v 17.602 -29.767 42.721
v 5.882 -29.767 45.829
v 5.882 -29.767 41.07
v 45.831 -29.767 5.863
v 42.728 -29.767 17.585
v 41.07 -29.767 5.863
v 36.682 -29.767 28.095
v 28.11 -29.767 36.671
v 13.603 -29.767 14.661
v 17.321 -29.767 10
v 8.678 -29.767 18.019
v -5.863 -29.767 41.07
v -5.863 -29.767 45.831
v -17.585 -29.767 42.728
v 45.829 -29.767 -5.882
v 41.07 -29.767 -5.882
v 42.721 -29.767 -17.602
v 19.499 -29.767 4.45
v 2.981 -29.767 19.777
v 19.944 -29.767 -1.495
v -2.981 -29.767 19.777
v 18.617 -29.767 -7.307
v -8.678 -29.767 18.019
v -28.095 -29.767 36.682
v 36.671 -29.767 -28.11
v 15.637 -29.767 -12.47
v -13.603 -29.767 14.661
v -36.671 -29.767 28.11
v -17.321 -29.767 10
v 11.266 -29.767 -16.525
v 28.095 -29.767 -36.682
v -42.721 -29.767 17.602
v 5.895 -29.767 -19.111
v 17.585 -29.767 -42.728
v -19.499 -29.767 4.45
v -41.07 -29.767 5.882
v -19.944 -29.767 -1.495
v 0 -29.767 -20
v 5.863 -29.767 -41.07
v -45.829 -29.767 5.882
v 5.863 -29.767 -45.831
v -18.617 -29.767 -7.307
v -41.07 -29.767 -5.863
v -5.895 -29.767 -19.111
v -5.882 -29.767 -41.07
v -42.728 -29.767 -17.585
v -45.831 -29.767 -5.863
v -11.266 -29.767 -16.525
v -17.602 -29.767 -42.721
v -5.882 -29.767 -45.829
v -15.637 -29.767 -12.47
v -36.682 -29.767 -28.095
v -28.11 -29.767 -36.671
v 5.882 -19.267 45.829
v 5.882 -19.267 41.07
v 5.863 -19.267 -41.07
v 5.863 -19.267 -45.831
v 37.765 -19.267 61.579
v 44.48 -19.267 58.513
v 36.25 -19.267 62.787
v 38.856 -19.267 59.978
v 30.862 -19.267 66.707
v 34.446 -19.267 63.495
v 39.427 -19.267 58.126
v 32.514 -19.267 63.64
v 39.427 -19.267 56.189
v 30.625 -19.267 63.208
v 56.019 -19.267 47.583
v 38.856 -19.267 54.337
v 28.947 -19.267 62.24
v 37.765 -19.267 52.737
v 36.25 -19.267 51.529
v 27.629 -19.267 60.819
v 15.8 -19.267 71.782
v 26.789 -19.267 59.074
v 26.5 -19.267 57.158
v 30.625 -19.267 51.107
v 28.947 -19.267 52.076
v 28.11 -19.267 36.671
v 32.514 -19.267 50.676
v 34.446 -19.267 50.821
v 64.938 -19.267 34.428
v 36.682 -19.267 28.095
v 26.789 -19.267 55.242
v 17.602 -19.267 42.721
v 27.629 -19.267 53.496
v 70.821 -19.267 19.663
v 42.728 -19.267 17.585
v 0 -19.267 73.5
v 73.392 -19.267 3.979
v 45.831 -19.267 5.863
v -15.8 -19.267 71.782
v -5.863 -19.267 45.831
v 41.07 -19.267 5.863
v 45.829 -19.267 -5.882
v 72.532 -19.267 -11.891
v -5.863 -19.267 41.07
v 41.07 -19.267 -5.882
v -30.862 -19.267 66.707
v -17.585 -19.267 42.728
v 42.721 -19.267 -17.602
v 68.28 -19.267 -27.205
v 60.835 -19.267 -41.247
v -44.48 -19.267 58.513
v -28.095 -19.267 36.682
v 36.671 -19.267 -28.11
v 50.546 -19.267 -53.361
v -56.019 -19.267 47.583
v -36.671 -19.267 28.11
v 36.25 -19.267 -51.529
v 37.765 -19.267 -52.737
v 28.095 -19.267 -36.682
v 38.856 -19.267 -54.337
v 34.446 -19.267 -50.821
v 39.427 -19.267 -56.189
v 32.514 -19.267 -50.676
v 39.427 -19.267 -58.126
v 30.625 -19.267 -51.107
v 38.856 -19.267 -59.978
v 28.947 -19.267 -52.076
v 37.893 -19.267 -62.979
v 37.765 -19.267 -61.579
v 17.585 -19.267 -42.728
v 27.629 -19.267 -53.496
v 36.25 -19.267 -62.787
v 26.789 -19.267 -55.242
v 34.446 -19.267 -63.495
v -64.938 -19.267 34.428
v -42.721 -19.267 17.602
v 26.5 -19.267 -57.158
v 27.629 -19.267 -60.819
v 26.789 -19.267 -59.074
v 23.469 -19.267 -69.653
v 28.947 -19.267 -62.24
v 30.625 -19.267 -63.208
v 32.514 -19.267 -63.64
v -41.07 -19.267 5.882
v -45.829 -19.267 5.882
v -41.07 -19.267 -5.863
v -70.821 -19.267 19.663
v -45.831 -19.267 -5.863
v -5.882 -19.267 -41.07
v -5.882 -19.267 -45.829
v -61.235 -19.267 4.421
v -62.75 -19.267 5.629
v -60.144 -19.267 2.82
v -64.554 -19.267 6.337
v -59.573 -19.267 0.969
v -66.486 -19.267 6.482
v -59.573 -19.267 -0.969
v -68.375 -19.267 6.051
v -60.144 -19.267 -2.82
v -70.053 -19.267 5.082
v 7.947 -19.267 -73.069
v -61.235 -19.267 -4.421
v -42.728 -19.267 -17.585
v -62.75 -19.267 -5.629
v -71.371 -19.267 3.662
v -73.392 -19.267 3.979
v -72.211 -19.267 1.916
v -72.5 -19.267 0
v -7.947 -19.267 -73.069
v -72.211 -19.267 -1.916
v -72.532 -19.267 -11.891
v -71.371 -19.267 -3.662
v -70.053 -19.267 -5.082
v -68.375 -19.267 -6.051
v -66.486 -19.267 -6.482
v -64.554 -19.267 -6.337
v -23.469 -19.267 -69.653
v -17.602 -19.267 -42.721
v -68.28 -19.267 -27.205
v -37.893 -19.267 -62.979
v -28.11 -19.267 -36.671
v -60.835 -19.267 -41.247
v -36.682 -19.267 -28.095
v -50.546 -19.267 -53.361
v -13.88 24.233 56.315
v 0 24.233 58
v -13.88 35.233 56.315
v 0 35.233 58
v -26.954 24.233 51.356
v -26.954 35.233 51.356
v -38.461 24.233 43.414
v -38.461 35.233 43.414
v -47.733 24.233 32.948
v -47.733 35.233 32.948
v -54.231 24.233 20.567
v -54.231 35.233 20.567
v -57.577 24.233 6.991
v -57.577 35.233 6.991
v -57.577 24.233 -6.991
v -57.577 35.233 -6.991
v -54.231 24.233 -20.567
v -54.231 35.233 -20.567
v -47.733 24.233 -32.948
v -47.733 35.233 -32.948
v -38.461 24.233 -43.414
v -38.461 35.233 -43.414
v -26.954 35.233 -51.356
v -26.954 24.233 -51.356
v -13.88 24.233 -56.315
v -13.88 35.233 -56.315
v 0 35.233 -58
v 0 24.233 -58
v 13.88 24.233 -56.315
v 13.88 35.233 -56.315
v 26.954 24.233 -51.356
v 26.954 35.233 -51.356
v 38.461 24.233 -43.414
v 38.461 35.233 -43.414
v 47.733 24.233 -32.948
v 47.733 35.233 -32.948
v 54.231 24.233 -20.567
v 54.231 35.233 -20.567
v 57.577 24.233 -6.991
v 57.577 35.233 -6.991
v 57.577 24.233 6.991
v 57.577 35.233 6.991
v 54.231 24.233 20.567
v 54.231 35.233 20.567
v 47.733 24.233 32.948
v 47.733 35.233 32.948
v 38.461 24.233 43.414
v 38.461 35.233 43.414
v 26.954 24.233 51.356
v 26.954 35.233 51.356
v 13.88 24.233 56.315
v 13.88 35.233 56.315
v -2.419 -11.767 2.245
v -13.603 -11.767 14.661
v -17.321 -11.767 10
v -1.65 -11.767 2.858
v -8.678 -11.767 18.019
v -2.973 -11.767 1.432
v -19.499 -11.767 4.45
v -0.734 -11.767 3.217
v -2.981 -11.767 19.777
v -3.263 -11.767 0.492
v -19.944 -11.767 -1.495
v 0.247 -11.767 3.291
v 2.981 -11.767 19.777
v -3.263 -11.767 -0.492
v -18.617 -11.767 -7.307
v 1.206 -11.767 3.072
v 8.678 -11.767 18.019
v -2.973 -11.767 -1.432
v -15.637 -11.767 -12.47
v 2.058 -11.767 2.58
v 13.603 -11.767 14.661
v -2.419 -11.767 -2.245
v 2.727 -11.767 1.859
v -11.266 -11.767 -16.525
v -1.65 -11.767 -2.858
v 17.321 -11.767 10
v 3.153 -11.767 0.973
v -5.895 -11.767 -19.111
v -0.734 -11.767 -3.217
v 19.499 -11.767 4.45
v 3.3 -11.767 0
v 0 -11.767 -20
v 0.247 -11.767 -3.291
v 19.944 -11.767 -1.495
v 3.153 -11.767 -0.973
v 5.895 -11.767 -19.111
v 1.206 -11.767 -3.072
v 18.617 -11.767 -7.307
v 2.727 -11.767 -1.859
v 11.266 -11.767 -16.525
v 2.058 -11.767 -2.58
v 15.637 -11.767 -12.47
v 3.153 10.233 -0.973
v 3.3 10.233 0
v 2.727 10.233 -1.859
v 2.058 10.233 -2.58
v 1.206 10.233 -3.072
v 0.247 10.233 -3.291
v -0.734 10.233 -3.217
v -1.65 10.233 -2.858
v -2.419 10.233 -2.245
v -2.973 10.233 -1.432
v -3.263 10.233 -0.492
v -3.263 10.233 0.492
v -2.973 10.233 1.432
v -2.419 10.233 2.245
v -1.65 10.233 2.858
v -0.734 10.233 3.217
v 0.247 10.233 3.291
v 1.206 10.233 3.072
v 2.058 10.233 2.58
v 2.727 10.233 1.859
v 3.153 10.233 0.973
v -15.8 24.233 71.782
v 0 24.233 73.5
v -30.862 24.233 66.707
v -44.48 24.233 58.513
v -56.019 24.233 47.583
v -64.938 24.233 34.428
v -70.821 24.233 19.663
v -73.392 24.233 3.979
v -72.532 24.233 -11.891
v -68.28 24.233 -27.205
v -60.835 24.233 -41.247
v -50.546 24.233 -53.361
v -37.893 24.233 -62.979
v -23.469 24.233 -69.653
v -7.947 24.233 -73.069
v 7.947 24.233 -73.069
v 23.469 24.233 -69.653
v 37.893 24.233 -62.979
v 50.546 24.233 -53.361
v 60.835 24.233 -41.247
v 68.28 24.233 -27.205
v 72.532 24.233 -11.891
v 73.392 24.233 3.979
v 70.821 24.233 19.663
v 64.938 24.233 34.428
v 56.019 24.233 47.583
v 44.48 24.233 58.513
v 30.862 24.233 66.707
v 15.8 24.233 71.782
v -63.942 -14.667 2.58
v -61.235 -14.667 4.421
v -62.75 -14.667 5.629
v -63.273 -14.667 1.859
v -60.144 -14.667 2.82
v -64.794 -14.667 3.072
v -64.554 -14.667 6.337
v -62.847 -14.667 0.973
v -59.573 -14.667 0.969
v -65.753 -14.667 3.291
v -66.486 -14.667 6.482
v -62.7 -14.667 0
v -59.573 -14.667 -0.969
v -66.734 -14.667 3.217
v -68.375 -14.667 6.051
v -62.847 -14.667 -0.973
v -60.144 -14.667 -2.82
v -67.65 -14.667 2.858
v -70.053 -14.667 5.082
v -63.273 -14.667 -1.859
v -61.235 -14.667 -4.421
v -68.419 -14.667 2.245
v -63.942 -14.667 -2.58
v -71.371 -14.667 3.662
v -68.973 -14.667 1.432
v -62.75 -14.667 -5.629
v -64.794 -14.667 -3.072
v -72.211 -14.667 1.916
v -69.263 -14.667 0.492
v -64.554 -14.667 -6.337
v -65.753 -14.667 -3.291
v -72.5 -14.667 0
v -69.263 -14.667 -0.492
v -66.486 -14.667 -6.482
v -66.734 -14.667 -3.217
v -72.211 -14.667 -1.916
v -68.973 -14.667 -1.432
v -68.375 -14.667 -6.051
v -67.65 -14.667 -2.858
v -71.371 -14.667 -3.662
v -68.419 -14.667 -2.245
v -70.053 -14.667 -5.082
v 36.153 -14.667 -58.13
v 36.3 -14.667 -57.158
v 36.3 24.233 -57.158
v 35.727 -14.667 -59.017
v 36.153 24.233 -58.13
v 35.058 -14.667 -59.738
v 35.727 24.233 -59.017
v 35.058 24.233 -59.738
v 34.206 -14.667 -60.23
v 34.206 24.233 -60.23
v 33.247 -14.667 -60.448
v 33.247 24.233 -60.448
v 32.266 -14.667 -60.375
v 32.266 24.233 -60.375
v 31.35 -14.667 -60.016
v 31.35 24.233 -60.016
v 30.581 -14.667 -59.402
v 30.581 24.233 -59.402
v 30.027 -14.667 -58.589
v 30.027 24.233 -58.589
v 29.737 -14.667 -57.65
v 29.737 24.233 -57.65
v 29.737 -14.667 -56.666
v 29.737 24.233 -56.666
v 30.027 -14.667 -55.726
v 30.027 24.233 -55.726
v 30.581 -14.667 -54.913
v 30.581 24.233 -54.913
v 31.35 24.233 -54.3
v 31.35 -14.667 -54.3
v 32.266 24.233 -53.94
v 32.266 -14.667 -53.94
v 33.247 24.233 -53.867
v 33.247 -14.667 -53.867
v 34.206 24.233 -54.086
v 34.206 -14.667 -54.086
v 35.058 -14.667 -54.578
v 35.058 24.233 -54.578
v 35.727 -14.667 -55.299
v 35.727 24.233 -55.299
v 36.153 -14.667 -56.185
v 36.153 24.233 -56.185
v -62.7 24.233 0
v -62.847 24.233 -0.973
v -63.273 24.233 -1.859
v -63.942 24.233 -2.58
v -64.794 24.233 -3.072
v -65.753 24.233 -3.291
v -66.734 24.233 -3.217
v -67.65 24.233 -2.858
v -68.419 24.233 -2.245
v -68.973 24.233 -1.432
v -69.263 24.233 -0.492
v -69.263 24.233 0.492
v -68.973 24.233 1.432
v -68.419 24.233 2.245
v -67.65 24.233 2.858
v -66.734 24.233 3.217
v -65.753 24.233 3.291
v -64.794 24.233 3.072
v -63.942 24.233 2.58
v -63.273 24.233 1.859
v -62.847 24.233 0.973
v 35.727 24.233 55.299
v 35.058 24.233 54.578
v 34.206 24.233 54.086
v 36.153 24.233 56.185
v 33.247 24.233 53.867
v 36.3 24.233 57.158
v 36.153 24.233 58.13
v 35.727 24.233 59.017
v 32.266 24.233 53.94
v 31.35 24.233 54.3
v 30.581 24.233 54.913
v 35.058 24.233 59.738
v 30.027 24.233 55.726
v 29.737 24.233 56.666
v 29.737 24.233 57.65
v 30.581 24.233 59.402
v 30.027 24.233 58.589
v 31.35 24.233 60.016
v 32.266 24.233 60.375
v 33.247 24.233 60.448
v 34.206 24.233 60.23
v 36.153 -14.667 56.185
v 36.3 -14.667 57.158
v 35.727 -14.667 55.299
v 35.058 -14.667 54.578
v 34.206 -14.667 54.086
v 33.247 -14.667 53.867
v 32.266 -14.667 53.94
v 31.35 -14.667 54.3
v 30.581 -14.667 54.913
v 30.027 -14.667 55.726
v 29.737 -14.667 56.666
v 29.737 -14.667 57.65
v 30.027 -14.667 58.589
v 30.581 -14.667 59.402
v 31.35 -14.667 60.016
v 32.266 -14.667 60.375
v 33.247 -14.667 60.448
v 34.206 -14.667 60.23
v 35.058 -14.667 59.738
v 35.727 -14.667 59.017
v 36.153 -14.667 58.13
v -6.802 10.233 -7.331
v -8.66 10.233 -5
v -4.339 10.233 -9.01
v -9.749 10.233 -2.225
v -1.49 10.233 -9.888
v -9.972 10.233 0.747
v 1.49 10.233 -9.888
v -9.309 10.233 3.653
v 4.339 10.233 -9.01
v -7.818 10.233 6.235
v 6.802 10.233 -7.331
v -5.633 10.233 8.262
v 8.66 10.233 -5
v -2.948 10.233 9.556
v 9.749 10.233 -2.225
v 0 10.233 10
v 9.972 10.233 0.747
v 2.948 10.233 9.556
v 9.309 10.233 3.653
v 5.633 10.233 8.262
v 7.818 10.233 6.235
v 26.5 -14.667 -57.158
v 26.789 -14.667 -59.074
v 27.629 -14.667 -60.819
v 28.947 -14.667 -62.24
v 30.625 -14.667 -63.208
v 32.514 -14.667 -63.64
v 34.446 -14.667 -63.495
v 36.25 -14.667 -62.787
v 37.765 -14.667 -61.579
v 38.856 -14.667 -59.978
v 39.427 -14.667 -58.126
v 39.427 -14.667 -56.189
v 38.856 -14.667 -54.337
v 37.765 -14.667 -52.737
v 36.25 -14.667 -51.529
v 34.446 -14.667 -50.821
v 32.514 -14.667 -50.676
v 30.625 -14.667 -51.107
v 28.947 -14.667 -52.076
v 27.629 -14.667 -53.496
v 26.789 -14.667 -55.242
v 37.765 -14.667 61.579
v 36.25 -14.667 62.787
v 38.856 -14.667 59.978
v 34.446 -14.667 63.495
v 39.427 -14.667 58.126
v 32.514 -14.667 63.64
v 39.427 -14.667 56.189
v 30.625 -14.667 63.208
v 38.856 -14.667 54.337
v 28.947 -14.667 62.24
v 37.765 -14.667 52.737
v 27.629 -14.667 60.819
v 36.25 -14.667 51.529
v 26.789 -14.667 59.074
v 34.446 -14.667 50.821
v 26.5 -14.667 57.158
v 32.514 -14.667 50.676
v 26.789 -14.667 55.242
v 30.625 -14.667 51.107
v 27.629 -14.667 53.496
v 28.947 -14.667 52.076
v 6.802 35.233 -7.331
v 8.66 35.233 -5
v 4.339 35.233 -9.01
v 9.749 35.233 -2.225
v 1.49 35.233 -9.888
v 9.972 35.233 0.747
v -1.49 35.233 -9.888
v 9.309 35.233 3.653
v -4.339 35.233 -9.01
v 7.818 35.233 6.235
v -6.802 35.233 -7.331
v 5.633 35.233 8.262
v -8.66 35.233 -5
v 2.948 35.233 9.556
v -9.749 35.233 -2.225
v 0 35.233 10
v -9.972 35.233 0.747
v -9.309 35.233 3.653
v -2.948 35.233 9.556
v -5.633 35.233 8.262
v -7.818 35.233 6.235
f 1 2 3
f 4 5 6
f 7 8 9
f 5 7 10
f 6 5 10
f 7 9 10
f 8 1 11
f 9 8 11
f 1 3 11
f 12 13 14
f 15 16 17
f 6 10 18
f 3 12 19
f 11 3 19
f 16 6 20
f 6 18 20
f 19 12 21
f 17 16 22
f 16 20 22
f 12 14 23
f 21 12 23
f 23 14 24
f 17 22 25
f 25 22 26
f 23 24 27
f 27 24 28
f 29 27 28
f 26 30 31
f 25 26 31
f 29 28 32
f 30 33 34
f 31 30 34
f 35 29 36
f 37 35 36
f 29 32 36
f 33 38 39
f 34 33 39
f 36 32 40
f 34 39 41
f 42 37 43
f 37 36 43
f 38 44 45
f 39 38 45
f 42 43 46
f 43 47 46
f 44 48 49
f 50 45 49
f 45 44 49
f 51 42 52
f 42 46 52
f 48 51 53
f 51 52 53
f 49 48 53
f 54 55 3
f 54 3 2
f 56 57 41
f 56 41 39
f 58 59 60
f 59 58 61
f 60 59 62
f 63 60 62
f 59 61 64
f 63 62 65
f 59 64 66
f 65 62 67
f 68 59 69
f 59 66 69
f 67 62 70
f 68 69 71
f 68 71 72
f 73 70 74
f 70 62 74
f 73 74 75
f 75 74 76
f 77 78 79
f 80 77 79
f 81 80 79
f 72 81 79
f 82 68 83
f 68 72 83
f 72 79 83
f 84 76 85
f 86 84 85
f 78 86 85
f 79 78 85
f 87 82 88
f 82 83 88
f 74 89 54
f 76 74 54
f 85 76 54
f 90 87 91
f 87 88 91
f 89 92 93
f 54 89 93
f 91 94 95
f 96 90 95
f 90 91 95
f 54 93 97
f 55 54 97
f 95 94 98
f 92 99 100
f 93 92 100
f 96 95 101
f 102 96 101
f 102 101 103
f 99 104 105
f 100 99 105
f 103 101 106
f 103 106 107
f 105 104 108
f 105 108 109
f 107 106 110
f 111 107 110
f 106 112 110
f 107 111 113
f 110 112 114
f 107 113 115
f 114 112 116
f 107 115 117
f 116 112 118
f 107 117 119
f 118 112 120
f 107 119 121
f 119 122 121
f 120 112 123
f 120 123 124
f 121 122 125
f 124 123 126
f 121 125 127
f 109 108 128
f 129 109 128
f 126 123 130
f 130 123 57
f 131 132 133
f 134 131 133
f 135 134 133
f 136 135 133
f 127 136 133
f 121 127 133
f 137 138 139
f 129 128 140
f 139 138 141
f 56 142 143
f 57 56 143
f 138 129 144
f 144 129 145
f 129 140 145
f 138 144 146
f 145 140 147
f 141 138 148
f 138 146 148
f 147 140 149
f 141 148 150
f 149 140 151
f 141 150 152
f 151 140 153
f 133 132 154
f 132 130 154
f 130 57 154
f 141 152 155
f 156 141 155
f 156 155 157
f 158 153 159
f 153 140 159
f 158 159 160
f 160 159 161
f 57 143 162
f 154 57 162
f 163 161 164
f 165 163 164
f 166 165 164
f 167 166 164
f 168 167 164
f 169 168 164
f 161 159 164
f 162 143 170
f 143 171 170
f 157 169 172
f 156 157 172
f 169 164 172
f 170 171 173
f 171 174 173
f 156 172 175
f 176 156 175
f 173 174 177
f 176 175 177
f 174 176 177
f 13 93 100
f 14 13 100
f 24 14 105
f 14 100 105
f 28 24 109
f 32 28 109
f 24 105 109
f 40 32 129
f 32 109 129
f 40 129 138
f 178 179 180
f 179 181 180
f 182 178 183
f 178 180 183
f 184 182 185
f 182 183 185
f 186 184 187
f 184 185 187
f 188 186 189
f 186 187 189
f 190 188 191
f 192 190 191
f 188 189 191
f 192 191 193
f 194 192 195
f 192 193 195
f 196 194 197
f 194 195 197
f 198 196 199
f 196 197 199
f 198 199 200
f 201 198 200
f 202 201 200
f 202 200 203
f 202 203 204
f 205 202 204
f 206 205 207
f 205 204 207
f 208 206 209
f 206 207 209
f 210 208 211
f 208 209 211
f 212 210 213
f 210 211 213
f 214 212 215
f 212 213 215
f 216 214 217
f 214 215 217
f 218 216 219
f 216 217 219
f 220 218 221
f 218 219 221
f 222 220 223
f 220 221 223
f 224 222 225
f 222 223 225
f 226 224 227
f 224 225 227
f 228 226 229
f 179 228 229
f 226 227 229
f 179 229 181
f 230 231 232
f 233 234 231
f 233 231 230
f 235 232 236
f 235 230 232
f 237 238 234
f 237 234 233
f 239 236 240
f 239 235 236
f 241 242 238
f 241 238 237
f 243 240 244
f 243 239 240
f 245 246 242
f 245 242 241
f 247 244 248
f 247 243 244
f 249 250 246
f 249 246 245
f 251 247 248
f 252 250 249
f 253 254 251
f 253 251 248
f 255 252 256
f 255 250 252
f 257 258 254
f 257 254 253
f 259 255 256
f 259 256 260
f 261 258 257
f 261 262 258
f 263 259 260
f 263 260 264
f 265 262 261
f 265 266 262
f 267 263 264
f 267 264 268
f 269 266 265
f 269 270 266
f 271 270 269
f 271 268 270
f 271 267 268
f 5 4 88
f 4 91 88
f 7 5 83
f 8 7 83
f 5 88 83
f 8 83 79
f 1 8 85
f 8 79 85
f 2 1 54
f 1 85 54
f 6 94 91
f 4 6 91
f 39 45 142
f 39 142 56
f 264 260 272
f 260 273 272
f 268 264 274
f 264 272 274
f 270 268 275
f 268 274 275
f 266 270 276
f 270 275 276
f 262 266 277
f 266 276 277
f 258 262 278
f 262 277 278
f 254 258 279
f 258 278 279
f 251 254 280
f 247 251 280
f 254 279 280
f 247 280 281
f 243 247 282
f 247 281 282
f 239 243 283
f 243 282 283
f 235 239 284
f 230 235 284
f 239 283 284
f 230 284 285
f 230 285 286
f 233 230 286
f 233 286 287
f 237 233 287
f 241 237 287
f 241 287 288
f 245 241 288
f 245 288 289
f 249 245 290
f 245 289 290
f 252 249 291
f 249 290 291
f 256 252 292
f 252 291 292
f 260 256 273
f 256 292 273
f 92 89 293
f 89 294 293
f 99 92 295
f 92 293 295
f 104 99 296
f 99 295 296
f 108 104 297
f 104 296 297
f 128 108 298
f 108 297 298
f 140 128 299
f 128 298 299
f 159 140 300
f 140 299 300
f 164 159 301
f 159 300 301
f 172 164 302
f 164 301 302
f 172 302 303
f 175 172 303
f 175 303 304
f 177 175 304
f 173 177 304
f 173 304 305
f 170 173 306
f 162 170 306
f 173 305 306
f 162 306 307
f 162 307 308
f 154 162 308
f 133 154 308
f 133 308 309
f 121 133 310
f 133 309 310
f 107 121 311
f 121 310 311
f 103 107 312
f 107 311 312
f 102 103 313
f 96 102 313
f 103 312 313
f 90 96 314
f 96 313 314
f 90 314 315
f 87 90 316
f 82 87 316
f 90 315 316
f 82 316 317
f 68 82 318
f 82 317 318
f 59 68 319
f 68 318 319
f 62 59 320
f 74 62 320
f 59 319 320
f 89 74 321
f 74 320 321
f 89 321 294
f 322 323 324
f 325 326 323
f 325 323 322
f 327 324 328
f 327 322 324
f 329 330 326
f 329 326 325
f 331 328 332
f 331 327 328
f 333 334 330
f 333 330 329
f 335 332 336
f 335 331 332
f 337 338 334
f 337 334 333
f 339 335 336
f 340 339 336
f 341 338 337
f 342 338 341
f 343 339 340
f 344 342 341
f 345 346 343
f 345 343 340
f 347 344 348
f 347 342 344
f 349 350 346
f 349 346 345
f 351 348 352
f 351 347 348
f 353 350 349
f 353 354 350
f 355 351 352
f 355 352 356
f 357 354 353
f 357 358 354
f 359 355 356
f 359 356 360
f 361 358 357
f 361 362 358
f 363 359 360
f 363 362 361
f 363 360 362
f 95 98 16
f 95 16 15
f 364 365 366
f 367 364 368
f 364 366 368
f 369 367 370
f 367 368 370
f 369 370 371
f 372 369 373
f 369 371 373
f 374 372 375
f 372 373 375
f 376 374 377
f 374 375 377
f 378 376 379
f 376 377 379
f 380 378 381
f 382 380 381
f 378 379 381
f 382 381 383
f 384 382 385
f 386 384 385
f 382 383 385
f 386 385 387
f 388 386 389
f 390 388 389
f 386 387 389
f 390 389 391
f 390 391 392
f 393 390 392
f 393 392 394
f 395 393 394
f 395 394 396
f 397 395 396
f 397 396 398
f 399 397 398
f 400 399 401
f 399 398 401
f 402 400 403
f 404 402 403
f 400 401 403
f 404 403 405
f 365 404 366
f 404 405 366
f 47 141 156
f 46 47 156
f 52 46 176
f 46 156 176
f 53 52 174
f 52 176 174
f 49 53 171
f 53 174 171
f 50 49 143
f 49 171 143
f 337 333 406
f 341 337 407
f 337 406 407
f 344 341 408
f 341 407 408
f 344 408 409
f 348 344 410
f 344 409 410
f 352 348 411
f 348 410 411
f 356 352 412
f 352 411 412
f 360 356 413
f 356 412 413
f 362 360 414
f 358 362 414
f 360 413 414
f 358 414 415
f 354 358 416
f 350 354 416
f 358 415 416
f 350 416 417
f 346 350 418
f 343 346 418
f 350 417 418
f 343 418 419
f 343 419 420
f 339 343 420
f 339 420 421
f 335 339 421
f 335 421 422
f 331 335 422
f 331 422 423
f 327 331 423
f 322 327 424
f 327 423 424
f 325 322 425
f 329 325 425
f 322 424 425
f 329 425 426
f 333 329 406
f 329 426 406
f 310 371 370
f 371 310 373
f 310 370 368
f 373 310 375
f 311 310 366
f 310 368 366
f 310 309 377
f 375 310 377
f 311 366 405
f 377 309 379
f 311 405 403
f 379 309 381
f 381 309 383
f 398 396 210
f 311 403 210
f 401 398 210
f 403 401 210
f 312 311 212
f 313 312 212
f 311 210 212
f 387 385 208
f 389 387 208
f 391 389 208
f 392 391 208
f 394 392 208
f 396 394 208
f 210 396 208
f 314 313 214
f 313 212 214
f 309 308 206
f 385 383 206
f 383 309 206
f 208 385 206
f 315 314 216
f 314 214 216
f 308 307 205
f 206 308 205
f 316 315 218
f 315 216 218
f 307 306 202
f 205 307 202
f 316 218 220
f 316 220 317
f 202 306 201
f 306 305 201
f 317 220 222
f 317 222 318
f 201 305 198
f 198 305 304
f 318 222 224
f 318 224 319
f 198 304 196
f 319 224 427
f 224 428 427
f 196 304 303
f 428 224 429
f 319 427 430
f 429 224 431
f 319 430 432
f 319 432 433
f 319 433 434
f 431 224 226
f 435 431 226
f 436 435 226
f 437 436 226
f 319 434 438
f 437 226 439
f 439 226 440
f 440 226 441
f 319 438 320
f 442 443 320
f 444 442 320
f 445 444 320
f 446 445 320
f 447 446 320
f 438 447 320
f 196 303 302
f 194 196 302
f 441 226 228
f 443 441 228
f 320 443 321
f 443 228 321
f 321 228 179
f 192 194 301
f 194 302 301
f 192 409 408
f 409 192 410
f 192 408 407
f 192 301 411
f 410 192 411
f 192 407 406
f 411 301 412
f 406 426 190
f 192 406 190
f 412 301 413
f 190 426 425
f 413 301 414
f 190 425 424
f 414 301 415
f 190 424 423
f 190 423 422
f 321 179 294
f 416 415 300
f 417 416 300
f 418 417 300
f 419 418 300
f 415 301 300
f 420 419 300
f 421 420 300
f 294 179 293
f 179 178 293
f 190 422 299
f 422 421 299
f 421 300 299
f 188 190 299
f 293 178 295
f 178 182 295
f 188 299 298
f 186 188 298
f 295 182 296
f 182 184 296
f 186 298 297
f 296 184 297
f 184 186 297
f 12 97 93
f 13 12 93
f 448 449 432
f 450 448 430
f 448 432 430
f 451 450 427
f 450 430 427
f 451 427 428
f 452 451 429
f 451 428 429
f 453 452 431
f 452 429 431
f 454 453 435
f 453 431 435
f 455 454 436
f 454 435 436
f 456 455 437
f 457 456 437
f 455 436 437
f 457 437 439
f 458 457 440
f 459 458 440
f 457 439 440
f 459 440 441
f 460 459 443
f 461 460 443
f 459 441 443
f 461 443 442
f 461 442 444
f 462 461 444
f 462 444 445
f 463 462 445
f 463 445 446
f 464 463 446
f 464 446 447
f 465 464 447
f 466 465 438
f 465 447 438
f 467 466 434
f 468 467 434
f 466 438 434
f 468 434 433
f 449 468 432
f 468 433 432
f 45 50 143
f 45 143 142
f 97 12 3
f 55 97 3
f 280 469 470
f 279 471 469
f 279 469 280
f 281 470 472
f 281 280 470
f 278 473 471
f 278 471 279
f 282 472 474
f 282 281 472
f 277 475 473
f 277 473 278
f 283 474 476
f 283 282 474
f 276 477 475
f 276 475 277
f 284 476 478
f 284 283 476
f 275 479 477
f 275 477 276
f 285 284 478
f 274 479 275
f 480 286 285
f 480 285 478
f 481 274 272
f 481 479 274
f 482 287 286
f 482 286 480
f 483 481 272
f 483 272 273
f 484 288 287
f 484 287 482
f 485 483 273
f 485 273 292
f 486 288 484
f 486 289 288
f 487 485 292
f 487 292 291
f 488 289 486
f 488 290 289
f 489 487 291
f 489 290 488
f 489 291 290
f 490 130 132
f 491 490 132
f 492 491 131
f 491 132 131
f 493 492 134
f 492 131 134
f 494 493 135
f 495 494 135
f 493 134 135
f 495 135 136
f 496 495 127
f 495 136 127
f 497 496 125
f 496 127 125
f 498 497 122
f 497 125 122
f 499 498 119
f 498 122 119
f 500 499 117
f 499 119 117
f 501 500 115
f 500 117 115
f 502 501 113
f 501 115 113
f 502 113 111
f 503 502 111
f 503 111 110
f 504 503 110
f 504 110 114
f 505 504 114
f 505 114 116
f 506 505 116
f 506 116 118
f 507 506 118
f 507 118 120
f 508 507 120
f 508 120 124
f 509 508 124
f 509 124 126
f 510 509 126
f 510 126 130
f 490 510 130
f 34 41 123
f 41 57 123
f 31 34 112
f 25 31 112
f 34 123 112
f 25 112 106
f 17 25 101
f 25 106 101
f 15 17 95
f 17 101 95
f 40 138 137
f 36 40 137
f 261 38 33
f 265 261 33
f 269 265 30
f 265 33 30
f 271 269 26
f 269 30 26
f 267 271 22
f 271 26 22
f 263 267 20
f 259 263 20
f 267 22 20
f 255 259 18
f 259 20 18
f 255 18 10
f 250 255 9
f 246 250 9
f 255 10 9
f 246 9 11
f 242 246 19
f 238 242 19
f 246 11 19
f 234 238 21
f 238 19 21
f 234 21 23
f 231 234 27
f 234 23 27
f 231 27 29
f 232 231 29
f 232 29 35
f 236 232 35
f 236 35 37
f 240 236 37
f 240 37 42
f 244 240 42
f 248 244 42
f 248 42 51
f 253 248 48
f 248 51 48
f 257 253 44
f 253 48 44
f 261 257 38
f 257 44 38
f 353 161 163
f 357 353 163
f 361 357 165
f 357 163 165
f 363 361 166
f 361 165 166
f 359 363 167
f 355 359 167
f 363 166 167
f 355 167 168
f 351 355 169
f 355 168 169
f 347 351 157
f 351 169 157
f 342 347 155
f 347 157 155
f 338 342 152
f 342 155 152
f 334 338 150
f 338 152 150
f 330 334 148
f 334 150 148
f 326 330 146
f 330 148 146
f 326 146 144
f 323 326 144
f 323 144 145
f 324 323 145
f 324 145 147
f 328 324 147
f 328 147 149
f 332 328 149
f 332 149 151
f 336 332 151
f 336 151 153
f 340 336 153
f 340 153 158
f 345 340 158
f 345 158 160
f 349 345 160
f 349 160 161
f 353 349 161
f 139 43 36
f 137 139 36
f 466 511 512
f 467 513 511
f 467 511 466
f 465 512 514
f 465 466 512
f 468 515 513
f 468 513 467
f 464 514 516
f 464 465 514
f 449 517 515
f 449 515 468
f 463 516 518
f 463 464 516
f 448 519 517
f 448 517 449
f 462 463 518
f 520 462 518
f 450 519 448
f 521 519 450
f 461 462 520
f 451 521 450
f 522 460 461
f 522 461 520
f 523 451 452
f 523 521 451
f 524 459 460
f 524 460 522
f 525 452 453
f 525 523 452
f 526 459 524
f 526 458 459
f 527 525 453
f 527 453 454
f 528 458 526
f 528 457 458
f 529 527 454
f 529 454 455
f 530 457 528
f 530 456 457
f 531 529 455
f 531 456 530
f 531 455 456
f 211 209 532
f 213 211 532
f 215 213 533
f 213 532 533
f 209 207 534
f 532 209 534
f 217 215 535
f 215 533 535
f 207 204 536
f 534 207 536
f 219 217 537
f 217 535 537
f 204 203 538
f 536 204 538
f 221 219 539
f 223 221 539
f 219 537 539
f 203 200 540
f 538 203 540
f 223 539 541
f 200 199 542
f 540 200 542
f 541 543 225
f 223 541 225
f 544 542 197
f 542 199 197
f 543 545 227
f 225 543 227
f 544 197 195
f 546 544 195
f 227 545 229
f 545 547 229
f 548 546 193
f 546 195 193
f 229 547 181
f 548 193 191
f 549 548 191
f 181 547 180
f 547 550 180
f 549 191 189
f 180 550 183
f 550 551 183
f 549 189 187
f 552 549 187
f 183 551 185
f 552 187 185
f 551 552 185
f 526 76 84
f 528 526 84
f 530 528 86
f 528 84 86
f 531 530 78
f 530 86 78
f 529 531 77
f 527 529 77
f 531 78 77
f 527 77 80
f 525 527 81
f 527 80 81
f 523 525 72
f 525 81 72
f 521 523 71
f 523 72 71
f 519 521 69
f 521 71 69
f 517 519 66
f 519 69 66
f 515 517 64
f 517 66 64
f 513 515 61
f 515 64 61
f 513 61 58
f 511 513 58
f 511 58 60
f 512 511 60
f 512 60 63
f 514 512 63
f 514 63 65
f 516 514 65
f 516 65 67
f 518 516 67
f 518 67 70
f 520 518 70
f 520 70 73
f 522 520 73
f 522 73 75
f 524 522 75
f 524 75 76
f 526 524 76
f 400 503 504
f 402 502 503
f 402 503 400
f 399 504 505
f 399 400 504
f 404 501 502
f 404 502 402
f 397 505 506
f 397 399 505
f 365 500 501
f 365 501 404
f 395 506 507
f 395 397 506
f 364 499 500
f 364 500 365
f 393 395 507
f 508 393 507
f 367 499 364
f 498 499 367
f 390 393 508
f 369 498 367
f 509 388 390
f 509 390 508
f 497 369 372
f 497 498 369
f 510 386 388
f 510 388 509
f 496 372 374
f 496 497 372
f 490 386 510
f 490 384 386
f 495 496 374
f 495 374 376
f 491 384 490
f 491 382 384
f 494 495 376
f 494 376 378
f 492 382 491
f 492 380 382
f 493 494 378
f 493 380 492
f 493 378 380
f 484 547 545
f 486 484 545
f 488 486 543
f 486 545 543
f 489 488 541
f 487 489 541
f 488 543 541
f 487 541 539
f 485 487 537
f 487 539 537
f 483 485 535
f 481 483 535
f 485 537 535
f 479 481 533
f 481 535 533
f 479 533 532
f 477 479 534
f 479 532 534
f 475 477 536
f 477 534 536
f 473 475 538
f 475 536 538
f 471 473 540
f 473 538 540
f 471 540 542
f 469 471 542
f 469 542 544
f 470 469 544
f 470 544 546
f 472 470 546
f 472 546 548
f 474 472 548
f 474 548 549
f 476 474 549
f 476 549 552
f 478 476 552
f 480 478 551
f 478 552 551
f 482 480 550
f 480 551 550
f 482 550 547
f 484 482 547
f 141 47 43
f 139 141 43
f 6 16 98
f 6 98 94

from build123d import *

# Parameters (mm, degrees)
CROQUIS2_R                                           = 10
CORTAR_EXTRUIR1_DEPTH                                = 25
CROQUIS3_R                                           = 20
CORTAR_EXTRUIR2_DEPTH                                = 18
REFRENTADO_PARA_TORNILLO_CON_CABEZA_TRON_D           = 6.6
REFRENTADO_PARA_TORNILLO_CON_CABEZA_TRON_CBORE_D     = 13
REFRENTADO_PARA_TORNILLO_CON_CABEZA_TRON_CBORE_DEPTH = 4.6
CROQUIS6_W                                           = 11.744841144
CROQUIS6_H                                           = 5.153406269
CROQUIS6_W_2                                         = 5.153406269
CROQUIS6_H_2                                         = 11.744841144
CORTAR_EXTRUIR3_DEPTH                                = 10.5


with BuildPart() as part:
    # Croquis1 → Revolución1 (revolve)
    with BuildSketch(Plane.XY, mode=Mode.PRIVATE) as revoluci_n1_sk:
        Polygon((73.5, -19.267048075), (73.5, 24.232951925), (58, 24.232951925), (58, 35.232951925), (0, 35.232951925), (0, -29.767048075), (46.20482663, -29.767048075), (46.20482663, -19.267048075), align=None)
    revolve(revoluci_n1_sk.sketch.rotate(Axis((0, 49.62191358, 0), (0, -1, 0)), 90), axis=Axis((0, 49.62191358, 0), (0, -1, 0)))

    # Croquis2 → Cortar-Extruir1 (cut)
    with BuildSketch(Plane(origin=(0, 35.232951925, 0), x_dir=(1, 0, 0), z_dir=(0, 1, 0))):
        with Locations(Location((0, 0, 0), (0, 0, 270))):
            Circle(CROQUIS2_R)
    extrude(amount=-CORTAR_EXTRUIR1_DEPTH, mode=Mode.SUBTRACT)

    # Croquis3 → Cortar-Extruir2 (cut)
    with BuildSketch(Plane.XZ.offset(29.767048075)):
        with Locations(Location((0, 0, 0), (0, 0, 270))):
            Circle(CROQUIS3_R)
    extrude(amount=-CORTAR_EXTRUIR2_DEPTH, mode=Mode.SUBTRACT)

    # Refrentado para tornillo con cabeza troncocónica de M61 (through all)
    with Locations(Plane(origin=(0, -19.267048075, 0), x_dir=(-1, 0, 0), z_dir=(0, -1, 0))):
        with Locations((66, 0), (-33, -57.15767665), (-33, 57.15767665), (0, 0)):
            CounterBoreHole(REFRENTADO_PARA_TORNILLO_CON_CABEZA_TRON_D / 2, REFRENTADO_PARA_TORNILLO_CON_CABEZA_TRON_CBORE_D / 2, REFRENTADO_PARA_TORNILLO_CON_CABEZA_TRON_CBORE_DEPTH)

    # Croquis6 → Cortar-Extruir3 (cut)
    with BuildSketch(Plane.XZ.offset(29.767048075)):
        with Locations((-0.00913166, -43.646748421)):
            Rectangle(CROQUIS6_W, CROQUIS6_H)
        with Locations((-43.646748421, 0.00913166)):
            Rectangle(CROQUIS6_W_2, CROQUIS6_H_2)
        with Locations((0.00913166, 43.646748421)):
            Rectangle(CROQUIS6_W, CROQUIS6_H)
        with Locations((43.646748421, -0.00913166)):
            Rectangle(CROQUIS6_W_2, CROQUIS6_H_2)
    extrude(amount=-CORTAR_EXTRUIR3_DEPTH, mode=Mode.SUBTRACT)


solid = part.part
